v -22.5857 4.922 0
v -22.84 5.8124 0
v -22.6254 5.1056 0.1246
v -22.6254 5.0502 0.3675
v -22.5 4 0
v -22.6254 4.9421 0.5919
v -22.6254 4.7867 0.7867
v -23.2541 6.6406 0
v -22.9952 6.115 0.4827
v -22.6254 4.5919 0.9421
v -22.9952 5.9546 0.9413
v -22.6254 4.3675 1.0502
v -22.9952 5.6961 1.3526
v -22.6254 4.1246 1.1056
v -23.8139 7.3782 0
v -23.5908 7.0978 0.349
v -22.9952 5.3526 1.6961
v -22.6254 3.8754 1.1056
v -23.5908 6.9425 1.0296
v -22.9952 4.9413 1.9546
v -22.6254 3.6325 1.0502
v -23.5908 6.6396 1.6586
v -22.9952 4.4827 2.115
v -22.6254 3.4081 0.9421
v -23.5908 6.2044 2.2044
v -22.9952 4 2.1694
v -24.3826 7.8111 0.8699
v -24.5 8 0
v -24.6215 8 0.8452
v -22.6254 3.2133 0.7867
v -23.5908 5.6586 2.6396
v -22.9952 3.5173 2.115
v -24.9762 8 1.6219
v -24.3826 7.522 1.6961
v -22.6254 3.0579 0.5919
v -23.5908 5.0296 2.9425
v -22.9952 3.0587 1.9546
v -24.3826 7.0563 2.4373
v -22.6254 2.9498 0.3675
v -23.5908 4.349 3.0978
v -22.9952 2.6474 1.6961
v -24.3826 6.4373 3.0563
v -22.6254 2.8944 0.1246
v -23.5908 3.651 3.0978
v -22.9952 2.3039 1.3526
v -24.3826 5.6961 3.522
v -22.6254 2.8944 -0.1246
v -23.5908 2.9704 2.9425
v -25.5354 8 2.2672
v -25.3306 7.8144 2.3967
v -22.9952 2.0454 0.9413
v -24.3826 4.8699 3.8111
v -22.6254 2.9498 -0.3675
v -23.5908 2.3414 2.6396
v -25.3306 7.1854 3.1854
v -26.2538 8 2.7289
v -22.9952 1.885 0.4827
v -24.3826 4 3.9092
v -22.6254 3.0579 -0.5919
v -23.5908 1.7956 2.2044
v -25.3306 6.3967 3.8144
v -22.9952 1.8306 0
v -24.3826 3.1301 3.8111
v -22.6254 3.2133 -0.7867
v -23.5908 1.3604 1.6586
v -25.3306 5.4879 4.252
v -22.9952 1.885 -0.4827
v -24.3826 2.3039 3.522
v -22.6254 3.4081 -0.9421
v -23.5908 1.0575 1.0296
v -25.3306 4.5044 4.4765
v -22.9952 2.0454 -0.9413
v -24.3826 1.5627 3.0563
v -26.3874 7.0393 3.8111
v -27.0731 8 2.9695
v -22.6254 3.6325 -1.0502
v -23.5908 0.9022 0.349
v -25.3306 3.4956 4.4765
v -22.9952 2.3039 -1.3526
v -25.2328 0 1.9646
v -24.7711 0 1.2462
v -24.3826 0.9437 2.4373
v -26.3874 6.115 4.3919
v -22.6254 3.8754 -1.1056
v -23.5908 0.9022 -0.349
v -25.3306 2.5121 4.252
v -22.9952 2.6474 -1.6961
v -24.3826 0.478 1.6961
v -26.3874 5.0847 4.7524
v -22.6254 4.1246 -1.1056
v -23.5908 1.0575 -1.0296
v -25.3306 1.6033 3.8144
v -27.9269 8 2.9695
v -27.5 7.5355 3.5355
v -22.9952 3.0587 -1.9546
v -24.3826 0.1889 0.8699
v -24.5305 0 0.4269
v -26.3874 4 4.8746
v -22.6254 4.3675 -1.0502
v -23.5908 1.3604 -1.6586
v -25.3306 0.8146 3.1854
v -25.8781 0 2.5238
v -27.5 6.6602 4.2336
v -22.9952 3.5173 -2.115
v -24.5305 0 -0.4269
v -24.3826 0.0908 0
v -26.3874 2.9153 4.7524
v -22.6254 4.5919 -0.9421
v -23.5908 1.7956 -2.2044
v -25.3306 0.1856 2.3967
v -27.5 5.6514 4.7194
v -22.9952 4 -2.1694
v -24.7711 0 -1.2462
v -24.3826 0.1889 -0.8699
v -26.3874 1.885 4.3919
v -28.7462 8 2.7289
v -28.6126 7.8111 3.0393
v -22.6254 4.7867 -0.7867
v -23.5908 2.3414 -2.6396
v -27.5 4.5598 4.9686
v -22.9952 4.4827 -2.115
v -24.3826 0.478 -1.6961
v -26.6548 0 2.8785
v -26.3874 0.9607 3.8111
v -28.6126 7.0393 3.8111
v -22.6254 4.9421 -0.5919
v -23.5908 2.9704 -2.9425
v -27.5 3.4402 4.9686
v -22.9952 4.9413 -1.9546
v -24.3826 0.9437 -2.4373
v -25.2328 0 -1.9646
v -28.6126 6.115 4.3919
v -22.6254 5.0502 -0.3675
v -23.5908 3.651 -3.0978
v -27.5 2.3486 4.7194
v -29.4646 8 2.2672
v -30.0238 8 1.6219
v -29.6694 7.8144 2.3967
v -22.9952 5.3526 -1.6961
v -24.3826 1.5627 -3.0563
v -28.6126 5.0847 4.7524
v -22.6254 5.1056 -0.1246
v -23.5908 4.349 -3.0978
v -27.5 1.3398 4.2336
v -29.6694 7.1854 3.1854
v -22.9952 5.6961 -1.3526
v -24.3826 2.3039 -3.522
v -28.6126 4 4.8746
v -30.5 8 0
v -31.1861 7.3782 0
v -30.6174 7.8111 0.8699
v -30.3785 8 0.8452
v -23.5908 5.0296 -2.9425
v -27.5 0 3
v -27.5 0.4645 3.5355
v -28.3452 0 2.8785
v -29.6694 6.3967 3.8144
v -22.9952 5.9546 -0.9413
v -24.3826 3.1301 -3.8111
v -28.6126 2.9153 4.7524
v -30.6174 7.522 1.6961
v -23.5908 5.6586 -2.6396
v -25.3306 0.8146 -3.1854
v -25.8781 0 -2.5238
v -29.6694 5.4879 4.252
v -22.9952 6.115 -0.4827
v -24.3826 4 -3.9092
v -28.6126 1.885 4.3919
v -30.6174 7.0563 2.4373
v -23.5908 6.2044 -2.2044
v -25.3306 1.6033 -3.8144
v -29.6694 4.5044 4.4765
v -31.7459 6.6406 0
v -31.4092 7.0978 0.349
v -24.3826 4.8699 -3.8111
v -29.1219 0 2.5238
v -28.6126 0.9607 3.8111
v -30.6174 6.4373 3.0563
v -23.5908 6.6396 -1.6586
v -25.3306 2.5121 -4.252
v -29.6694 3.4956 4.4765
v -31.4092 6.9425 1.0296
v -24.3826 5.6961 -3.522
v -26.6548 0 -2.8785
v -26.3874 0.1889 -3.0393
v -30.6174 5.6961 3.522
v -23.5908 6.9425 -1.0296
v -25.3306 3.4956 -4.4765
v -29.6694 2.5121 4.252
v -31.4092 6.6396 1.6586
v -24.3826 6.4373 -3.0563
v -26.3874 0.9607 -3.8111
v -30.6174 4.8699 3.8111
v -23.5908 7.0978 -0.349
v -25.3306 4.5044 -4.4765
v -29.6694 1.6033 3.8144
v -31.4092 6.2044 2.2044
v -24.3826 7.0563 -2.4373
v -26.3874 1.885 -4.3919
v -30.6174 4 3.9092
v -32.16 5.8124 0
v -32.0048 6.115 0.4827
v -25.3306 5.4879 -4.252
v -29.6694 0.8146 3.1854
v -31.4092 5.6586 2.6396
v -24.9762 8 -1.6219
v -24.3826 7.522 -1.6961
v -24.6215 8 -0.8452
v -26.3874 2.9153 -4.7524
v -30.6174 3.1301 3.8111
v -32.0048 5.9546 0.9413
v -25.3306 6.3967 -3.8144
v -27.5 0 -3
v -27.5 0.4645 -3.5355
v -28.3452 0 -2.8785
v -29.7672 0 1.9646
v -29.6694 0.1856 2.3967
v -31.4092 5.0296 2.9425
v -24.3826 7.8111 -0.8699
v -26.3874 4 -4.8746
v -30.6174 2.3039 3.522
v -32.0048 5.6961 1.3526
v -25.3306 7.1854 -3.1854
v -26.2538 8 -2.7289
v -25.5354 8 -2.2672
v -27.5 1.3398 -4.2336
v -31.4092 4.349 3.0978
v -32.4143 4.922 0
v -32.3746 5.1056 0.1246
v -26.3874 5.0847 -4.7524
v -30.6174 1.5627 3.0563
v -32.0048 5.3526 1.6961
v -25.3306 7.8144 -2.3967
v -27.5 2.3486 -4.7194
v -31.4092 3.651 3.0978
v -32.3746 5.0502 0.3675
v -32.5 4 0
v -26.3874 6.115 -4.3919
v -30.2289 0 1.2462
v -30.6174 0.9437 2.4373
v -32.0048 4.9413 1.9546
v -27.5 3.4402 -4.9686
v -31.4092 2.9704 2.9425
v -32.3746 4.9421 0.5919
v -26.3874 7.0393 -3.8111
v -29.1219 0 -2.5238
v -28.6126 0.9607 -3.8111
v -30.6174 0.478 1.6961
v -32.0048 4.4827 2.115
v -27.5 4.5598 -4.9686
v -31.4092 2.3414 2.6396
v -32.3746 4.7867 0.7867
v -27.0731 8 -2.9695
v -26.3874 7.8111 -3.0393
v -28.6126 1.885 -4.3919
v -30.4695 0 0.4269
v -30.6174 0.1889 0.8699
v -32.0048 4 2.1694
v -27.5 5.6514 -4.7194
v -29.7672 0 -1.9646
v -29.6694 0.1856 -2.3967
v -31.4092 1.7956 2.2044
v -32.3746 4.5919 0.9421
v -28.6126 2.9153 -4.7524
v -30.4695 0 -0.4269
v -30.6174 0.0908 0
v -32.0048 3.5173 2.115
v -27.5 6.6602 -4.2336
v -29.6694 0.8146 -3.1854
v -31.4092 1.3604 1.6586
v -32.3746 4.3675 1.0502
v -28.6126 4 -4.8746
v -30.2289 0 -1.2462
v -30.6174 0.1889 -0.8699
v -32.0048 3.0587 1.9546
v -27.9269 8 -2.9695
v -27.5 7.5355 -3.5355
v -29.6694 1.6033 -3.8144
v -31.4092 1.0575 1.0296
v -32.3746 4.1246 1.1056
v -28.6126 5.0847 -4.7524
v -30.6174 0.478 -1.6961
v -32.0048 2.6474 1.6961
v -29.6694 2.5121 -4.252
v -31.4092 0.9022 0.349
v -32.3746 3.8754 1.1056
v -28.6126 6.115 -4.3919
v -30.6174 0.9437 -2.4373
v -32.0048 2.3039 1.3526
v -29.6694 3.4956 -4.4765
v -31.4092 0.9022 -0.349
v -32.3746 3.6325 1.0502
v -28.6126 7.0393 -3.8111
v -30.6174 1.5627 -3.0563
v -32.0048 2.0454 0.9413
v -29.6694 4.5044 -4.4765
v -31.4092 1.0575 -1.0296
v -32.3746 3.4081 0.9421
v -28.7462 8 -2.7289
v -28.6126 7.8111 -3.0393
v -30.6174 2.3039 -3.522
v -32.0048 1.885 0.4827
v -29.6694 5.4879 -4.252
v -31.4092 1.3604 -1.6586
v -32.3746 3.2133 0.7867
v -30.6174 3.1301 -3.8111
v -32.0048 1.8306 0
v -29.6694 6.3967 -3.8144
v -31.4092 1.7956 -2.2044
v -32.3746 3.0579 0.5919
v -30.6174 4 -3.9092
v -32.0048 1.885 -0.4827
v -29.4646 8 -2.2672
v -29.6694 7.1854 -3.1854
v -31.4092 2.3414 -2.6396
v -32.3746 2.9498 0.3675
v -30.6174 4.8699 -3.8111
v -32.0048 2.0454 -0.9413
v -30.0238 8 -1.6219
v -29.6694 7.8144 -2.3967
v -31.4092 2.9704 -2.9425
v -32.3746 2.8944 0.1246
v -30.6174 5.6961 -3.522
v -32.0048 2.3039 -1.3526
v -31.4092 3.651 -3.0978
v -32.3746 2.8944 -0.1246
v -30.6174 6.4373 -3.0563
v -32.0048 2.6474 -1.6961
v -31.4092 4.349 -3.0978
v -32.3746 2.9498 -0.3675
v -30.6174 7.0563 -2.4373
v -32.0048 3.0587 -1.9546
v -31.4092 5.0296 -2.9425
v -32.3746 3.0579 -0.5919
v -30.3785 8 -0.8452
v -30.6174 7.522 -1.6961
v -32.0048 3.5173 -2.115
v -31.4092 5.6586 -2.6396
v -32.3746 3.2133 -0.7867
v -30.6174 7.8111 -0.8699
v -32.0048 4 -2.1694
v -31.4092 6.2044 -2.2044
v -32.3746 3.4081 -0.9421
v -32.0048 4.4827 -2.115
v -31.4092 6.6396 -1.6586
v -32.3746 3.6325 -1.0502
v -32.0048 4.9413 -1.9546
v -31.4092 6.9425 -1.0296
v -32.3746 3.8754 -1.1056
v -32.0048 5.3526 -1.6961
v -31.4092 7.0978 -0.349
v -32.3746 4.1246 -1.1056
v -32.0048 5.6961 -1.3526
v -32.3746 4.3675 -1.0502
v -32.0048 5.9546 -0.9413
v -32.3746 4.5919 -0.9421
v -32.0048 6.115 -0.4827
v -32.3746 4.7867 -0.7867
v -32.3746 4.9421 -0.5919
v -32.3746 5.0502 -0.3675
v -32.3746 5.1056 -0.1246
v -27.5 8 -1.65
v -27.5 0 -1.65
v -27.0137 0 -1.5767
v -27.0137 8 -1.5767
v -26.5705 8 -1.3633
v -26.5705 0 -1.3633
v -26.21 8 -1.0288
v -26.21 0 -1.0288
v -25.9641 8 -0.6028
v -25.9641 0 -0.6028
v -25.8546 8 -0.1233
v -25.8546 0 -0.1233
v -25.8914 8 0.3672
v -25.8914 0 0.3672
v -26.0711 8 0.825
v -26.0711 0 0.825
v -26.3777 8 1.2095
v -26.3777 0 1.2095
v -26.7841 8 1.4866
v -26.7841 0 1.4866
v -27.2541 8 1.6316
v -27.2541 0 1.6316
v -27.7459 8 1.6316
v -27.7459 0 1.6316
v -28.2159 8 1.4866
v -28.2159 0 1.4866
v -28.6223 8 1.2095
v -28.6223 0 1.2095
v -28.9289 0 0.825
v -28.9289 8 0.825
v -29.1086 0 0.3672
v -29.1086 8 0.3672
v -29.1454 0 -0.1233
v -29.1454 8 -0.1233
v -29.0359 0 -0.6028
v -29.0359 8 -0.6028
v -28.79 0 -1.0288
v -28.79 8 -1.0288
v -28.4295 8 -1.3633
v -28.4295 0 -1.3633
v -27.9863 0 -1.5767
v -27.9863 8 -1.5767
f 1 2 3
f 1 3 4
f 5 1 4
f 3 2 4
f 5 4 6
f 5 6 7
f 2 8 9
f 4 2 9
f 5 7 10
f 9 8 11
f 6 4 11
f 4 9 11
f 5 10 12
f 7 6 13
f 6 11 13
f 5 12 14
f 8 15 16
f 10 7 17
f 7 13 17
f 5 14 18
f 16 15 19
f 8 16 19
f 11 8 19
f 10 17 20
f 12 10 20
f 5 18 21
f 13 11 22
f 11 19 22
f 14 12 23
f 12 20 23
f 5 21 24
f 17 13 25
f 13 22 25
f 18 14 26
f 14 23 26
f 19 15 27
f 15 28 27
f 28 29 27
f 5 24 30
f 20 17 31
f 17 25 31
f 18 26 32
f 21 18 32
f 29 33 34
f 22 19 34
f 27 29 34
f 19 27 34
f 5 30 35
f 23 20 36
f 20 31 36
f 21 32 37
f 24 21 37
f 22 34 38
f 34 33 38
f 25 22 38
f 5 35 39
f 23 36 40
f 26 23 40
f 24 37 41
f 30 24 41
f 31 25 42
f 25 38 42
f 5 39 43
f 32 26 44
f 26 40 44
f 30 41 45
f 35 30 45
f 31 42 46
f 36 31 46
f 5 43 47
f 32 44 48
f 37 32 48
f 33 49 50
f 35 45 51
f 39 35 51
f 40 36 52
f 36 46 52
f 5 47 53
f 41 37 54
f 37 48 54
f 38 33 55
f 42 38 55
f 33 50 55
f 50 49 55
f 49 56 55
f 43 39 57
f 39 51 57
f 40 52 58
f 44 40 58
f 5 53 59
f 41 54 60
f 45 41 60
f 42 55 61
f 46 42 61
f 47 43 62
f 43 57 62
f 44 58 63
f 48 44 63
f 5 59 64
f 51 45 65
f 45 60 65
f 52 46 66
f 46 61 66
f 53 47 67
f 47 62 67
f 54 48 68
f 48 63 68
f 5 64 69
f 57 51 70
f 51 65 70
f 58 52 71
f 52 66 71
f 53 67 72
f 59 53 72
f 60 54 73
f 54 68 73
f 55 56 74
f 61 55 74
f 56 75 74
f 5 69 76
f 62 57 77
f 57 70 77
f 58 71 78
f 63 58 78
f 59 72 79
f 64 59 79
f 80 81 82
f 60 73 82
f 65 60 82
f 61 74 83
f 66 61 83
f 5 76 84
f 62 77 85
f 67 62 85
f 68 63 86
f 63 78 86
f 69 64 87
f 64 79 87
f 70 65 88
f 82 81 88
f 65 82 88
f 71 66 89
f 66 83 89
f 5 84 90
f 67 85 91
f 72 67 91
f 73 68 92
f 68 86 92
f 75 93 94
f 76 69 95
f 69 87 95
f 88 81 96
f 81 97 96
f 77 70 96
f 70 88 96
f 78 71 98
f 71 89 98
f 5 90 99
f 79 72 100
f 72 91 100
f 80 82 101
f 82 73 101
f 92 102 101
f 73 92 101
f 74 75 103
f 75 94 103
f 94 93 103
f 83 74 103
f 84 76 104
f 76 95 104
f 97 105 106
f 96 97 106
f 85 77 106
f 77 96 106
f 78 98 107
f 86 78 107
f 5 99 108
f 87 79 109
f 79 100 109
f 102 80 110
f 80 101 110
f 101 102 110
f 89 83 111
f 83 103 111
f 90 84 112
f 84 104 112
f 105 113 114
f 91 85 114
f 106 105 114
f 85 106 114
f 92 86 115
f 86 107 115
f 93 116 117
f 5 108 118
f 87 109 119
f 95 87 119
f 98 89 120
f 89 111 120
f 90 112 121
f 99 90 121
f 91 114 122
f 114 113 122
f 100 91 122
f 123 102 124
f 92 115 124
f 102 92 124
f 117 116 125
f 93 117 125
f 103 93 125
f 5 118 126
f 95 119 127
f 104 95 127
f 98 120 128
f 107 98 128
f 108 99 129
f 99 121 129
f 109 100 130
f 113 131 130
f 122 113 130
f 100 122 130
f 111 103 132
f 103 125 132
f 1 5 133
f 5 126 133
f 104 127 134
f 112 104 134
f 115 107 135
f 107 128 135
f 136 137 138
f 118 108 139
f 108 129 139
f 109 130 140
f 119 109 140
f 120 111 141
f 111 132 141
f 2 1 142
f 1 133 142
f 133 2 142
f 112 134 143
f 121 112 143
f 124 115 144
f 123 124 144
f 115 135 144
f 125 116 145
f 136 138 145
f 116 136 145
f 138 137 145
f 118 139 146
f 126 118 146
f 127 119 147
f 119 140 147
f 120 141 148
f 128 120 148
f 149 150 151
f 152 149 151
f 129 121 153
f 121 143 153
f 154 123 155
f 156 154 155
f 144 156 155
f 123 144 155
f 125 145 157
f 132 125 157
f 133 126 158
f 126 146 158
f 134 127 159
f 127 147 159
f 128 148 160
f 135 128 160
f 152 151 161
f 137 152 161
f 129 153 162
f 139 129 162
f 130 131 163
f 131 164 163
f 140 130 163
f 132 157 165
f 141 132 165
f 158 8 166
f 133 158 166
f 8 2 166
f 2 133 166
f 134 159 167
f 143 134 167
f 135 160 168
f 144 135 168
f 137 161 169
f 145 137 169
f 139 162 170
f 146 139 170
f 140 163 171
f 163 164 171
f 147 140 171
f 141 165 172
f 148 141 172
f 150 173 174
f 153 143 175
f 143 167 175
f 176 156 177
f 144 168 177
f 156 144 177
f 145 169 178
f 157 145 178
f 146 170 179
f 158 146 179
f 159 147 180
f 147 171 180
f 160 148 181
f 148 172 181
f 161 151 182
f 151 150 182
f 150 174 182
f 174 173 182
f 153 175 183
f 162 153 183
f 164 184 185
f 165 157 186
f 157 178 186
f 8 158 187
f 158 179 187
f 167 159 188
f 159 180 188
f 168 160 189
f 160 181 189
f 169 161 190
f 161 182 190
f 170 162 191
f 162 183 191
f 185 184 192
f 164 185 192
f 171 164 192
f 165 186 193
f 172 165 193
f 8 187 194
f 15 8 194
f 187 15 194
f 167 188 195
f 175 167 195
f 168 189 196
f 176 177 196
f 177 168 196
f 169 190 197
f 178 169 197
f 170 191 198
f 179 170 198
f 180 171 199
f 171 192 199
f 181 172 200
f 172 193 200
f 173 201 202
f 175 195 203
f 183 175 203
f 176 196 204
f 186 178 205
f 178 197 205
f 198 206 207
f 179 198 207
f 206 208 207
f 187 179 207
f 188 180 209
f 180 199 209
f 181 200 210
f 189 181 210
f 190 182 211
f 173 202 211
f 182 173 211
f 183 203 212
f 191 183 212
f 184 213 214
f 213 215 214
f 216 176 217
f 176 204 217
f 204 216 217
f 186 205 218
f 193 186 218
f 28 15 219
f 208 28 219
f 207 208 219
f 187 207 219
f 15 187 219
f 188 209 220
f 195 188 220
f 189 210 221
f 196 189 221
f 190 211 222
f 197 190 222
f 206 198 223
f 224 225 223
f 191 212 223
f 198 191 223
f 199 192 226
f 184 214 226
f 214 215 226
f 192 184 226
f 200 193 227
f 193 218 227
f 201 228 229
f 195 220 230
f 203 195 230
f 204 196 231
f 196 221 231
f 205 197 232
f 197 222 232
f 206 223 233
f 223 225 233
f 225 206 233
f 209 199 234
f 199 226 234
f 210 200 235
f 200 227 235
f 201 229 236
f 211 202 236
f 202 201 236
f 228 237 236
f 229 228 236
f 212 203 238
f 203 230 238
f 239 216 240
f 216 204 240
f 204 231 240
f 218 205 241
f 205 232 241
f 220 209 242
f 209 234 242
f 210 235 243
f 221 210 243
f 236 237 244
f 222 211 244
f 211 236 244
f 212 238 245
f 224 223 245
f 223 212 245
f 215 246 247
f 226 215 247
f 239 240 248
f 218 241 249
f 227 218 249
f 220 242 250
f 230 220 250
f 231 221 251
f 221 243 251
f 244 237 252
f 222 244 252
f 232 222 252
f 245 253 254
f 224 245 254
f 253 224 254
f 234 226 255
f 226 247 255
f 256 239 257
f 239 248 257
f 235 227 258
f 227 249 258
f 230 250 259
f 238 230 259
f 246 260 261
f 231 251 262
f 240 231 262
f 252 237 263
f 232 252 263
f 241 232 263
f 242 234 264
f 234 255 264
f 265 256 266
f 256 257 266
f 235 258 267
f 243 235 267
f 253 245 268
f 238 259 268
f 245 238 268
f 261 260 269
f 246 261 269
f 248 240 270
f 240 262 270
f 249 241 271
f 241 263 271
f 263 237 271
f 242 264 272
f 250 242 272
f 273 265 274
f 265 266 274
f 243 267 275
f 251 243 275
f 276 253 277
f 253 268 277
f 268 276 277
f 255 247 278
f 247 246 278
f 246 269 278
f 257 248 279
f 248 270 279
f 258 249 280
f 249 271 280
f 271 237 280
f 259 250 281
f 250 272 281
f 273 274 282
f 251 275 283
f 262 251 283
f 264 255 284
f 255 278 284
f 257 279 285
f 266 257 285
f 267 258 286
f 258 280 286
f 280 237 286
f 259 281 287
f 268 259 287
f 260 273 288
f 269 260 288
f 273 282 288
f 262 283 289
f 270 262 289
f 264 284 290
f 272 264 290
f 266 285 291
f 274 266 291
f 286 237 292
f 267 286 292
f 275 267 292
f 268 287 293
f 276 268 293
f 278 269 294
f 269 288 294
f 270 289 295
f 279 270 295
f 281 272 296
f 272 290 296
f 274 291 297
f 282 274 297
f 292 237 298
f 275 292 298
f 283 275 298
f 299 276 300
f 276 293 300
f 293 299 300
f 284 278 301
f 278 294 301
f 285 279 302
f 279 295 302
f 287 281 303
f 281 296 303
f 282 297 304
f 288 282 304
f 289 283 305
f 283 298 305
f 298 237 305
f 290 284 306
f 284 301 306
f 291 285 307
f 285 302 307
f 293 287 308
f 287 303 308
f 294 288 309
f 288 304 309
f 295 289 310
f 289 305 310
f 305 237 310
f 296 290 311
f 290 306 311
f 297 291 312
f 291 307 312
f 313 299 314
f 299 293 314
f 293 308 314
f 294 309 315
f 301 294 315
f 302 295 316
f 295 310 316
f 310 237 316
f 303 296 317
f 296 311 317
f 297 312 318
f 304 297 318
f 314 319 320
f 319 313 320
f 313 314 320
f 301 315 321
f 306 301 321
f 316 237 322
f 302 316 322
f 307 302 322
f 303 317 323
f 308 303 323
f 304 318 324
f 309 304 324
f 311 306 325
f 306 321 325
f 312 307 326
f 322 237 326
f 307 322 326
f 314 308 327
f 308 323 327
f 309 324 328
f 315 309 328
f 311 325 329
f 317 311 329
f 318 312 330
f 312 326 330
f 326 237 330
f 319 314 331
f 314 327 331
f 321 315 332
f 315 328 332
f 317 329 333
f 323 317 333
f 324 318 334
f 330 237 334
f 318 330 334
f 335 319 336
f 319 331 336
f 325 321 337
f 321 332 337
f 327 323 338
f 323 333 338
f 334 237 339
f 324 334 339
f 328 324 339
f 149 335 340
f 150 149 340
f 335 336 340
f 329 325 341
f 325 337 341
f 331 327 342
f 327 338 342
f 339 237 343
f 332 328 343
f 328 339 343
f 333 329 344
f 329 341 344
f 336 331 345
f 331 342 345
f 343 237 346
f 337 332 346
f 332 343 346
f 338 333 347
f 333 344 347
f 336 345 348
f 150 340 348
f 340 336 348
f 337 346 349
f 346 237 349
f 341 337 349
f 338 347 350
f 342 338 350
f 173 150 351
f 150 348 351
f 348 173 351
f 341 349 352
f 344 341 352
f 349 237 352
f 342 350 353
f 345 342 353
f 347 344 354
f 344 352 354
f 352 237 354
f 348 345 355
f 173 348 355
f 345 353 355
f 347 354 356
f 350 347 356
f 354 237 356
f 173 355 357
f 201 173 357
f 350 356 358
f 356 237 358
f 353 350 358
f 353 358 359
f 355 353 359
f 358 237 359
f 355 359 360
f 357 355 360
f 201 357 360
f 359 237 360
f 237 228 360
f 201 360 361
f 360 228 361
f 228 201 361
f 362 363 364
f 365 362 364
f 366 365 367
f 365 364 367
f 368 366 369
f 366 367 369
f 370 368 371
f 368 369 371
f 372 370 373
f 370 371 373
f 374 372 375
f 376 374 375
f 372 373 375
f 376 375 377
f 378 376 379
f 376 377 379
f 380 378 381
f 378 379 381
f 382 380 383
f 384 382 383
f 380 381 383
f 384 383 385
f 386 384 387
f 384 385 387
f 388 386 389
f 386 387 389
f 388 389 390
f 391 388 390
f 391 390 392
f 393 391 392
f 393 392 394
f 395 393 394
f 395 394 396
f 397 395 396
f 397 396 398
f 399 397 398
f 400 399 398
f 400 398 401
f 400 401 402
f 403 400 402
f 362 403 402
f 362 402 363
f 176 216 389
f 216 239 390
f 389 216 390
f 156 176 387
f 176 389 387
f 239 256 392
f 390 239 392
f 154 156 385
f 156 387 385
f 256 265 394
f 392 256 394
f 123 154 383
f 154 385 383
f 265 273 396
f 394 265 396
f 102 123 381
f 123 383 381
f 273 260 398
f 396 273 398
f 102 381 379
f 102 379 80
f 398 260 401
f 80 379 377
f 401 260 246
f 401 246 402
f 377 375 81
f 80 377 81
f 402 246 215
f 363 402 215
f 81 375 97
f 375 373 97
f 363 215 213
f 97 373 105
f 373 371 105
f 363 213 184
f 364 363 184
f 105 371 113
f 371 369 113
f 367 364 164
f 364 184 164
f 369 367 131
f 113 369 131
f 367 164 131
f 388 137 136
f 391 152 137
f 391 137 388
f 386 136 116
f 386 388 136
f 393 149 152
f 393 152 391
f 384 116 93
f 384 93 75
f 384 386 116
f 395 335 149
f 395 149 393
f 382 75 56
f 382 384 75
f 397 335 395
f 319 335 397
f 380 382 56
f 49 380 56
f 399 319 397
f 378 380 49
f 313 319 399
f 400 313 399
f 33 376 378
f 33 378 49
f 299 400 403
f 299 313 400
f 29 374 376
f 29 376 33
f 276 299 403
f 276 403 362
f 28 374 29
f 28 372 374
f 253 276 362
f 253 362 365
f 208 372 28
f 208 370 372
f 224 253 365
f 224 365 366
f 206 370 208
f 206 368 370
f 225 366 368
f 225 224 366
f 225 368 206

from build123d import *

# Parameters (mm, degrees)
SKETCH1_W           = 70
SKETCH1_H           = 28
BOSS_EXTRUDE1_DEPTH = 8
SKETCH2_W           = 10
SKETCH2_H           = 10
CUT_EXTRUDE1_DEPTH  = 10
SKETCH3_R           = 2.15
CUT_EXTRUDE2_DEPTH  = 46.530209751
SKETCH5_W           = 16.977623655
SKETCH5_H           = 6.5
CUT_EXTRUDE4_DEPTH  = 39.535697736
SKETCH7_R           = 1.65
CUT_EXTRUDE5_DEPTH  = 10


# Read off the part's stored shape, not the designer's step: Cut-Revolve1
with BuildPart() as part:
    # Sketch1 → Boss-Extrude1 (new body)
    with BuildSketch(Plane(origin=(0, 0, 0), x_dir=(1, 0, 0), z_dir=(0, 1, 0))):
        Rectangle(SKETCH1_W, SKETCH1_H)
    extrude(amount=BOSS_EXTRUDE1_DEPTH)

    # Sketch2 → Cut-Extrude1 (cut)
    with BuildSketch(Plane(origin=(0, 8, 0), x_dir=(1, 0, 0), z_dir=(0, 1, 0))):
        with Locations((30, 0)):
            Rectangle(SKETCH2_W, SKETCH2_H)
    extrude(amount=-CUT_EXTRUDE1_DEPTH, mode=Mode.SUBTRACT)

    # Sketch3 → Cut-Extrude2 (cut, through all)
    with BuildSketch(Plane.XY.offset(14)):
        with Locations((31, 4)):
            Circle(SKETCH3_R)
    extrude(amount=-CUT_EXTRUDE2_DEPTH, mode=Mode.SUBTRACT)

    # Sketch5 → Cut-Extrude4 (cut, through all)
    with BuildSketch(Plane(origin=(0, 8, 0), x_dir=(1, 0, 0), z_dir=(0, 1, 0))):
        with Locations((-26.511188172, 10.75)):
            Rectangle(SKETCH5_W, SKETCH5_H)
        Polygon((-18.022376345, 14), (-18.022376345, 7.5), (1.977623655, 14), align=None)
        Polygon((1.977623655, -14), (-18.022376345, -7.5), (-18.022376345, -14), align=None)
        with Locations((-26.511188172, -10.75)):
            Rectangle(SKETCH5_W, SKETCH5_H)
    extrude(amount=-CUT_EXTRUDE4_DEPTH, mode=Mode.SUBTRACT)

    # Cut-Revolve1 outline → Cut-Revolve1 (revolve, cut)
    with BuildSketch(Plane(origin=(0, 4, 0), x_dir=(0, 1, 0), z_dir=(0, 0, -1))):
        with BuildLine():
            Line((0, -35), (8.5, -35))
            Line((8.5, -35), (8.5, -22.5))
            Line((8.5, -22.5), (14.560219779, -22.5))
            Line((14.560219779, -22.5), (14.560219779, 35))
            Line((14.560219779, 35), (0, 35))
            Line((0, 35), (0, -22.5))
            ThreePointArc((0, -22.5), (5, -27.5), (0, -32.5))
            Line((0, -32.5), (0, -35))
        make_face()
    revolve(axis=Axis((0, 4, 0), (1, 0, 0)), mode=Mode.SUBTRACT)

    # Sketch7 → Cut-Extrude5 (cut)
    with BuildSketch(Plane.XZ):
        with Locations(Location((-27.5, 0, 0), (0, 0, 270))):
            Circle(SKETCH7_R)
    extrude(amount=-CUT_EXTRUDE5_DEPTH, mode=Mode.SUBTRACT)


solid = part.part
